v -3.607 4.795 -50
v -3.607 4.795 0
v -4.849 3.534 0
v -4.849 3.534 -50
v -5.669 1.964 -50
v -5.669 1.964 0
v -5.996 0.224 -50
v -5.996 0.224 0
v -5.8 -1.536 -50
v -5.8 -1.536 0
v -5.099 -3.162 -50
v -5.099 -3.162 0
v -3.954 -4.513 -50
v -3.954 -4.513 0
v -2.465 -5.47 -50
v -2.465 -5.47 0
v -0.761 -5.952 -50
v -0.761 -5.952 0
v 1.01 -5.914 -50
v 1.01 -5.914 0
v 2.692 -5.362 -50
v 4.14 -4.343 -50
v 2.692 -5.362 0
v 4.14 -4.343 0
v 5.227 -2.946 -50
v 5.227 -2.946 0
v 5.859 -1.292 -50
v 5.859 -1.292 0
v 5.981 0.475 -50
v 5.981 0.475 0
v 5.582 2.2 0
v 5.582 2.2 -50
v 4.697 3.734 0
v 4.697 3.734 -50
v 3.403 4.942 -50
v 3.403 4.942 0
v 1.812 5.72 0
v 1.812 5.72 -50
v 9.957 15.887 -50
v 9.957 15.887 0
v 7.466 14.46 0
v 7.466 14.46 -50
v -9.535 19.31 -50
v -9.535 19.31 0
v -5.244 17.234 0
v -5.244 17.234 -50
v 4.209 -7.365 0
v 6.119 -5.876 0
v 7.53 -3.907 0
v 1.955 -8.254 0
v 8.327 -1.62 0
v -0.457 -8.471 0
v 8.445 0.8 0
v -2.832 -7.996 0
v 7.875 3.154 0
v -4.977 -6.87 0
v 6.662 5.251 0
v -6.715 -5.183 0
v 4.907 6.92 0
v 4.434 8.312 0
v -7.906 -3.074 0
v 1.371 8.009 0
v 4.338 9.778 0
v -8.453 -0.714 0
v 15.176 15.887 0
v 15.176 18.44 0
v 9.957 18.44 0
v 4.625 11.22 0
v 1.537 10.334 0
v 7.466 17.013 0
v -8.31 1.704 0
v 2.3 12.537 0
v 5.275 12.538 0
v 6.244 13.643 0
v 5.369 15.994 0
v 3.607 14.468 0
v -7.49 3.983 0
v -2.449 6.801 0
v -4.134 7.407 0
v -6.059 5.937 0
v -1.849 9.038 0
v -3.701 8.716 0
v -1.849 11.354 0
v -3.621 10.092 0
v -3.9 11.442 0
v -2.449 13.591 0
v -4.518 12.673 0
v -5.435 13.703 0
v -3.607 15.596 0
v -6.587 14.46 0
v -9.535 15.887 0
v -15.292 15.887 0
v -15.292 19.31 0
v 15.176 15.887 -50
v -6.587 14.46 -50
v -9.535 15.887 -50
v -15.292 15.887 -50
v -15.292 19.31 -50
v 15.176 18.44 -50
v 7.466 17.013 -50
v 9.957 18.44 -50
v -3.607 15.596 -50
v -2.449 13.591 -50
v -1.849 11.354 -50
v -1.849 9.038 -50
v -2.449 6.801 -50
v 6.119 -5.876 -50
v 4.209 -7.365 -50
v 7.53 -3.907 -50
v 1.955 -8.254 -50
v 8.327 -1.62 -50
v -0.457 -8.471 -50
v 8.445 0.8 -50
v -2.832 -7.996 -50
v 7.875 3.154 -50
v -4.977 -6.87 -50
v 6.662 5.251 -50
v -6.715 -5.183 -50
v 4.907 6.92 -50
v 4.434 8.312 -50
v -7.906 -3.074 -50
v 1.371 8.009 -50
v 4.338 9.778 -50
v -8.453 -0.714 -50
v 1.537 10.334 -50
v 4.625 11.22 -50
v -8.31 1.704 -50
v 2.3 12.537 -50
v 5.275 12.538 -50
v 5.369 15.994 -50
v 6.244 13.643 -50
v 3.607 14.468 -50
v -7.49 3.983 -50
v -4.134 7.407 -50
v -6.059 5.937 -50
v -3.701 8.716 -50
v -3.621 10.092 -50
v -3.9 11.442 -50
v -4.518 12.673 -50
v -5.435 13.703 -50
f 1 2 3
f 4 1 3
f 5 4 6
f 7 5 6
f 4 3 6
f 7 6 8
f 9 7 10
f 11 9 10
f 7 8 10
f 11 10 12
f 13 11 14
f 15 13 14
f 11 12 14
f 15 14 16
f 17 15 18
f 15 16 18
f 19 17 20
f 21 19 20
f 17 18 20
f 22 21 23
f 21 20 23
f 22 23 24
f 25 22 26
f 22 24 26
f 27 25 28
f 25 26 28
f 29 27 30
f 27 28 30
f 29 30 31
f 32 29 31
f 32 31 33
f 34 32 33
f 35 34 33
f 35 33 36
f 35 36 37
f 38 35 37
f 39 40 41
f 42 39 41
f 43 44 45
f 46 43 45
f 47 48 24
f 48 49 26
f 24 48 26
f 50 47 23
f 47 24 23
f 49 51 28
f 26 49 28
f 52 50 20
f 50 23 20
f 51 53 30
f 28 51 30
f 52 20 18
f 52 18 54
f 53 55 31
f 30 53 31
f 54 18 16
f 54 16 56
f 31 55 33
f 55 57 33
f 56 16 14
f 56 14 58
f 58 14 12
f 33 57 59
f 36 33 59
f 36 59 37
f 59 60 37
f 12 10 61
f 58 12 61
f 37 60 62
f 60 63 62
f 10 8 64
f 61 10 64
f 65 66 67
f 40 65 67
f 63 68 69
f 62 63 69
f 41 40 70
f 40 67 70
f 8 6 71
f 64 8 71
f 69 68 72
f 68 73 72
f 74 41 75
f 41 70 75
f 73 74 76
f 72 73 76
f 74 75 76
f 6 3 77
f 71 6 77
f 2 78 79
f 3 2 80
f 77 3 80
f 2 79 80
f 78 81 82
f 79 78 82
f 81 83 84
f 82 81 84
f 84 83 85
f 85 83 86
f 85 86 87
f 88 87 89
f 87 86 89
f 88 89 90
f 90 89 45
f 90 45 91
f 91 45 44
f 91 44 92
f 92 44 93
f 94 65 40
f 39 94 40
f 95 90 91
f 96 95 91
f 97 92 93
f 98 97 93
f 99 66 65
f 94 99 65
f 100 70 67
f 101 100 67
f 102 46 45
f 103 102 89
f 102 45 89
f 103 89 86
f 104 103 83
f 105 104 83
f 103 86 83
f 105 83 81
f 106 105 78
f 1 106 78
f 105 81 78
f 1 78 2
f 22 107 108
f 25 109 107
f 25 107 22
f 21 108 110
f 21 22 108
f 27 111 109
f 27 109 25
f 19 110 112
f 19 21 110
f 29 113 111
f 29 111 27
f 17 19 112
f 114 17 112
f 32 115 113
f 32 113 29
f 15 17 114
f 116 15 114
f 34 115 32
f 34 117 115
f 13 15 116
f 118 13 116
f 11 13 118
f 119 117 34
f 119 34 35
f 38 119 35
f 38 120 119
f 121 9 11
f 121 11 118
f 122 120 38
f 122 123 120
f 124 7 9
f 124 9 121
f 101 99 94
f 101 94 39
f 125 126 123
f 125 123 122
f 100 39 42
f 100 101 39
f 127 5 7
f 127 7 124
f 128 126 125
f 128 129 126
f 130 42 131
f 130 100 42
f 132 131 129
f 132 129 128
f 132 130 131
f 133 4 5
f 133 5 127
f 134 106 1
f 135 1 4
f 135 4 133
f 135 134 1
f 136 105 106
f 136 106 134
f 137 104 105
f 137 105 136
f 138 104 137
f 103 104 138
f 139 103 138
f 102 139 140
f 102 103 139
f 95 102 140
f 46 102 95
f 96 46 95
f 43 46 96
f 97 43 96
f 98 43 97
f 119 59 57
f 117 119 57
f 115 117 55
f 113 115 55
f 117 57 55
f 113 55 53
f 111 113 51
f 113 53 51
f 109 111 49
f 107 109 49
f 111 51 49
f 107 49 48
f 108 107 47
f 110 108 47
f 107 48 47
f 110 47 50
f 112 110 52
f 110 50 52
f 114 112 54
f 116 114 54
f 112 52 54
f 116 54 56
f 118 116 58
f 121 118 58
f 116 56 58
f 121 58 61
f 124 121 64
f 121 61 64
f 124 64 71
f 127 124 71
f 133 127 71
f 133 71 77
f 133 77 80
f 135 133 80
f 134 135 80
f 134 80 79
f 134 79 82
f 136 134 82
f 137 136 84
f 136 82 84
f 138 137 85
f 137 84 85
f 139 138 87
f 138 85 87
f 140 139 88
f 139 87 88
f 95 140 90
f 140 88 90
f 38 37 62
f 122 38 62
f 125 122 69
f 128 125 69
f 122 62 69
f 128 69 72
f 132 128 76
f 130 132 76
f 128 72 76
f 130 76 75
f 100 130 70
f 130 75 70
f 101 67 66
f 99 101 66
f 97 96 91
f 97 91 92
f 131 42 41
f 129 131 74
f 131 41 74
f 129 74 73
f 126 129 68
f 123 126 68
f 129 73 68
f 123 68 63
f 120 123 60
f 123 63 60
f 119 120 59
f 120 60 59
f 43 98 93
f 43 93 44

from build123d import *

# Parameters (mm, degrees)
BOSS_EXTRUDE1_DEPTH = 50


with BuildPart() as part:
    # Sketch1 → Boss-Extrude1 (new body)
    with BuildSketch(Plane.XY):
        with BuildLine():
            Line((-6.586608294, 14.460119027), (-9.534784216, 15.886812091))
            Line((-9.534784216, 15.886812091), (-15.291700897, 15.886812091))
            Line((-15.291700897, 15.886812091), (-15.291700897, 19.310099191))
            Line((-15.291700897, 19.310099191), (-9.534784216, 19.310099191))
            Line((-9.534784216, 19.310099191), (-5.244334477, 17.233847622))
            ThreePointArc((-5.244334477, 17.233847622), (-1.849307759, 11.35362893), (-3.606603855, 4.795040003))
            ThreePointArc((-3.606603855, 4.795040003), (1.009509443, -5.914464531), (1.811864615, 5.719890438))
            ThreePointArc((1.811864615, 5.719890438), (2.300023264, 12.537382377), (7.465898335, 17.012896867))
            Line((7.465898335, 17.012896867), (9.956628937, 18.439589931))
            Line((9.956628937, 18.439589931), (15.176123212, 18.439589931))
            Line((15.176123212, 18.439589931), (15.176123212, 15.886812091))
            Line((15.176123212, 15.886812091), (9.956628937, 15.886812091))
            Line((9.956628937, 15.886812091), (7.465898335, 14.460119027))
            ThreePointArc((7.465898335, 14.460119027), (4.624724664, 11.219877568), (4.906908203, 6.919667691))
            ThreePointArc((4.906908203, 6.919667691), (-0.457047842, -8.470575915), (-4.133856573, 7.407481279))
            ThreePointArc((-4.133856573, 7.407481279), (-3.899583331, 11.441781667), (-6.586608294, 14.460119027))
        make_face()
    extrude(amount=-BOSS_EXTRUDE1_DEPTH)


solid = part.part
